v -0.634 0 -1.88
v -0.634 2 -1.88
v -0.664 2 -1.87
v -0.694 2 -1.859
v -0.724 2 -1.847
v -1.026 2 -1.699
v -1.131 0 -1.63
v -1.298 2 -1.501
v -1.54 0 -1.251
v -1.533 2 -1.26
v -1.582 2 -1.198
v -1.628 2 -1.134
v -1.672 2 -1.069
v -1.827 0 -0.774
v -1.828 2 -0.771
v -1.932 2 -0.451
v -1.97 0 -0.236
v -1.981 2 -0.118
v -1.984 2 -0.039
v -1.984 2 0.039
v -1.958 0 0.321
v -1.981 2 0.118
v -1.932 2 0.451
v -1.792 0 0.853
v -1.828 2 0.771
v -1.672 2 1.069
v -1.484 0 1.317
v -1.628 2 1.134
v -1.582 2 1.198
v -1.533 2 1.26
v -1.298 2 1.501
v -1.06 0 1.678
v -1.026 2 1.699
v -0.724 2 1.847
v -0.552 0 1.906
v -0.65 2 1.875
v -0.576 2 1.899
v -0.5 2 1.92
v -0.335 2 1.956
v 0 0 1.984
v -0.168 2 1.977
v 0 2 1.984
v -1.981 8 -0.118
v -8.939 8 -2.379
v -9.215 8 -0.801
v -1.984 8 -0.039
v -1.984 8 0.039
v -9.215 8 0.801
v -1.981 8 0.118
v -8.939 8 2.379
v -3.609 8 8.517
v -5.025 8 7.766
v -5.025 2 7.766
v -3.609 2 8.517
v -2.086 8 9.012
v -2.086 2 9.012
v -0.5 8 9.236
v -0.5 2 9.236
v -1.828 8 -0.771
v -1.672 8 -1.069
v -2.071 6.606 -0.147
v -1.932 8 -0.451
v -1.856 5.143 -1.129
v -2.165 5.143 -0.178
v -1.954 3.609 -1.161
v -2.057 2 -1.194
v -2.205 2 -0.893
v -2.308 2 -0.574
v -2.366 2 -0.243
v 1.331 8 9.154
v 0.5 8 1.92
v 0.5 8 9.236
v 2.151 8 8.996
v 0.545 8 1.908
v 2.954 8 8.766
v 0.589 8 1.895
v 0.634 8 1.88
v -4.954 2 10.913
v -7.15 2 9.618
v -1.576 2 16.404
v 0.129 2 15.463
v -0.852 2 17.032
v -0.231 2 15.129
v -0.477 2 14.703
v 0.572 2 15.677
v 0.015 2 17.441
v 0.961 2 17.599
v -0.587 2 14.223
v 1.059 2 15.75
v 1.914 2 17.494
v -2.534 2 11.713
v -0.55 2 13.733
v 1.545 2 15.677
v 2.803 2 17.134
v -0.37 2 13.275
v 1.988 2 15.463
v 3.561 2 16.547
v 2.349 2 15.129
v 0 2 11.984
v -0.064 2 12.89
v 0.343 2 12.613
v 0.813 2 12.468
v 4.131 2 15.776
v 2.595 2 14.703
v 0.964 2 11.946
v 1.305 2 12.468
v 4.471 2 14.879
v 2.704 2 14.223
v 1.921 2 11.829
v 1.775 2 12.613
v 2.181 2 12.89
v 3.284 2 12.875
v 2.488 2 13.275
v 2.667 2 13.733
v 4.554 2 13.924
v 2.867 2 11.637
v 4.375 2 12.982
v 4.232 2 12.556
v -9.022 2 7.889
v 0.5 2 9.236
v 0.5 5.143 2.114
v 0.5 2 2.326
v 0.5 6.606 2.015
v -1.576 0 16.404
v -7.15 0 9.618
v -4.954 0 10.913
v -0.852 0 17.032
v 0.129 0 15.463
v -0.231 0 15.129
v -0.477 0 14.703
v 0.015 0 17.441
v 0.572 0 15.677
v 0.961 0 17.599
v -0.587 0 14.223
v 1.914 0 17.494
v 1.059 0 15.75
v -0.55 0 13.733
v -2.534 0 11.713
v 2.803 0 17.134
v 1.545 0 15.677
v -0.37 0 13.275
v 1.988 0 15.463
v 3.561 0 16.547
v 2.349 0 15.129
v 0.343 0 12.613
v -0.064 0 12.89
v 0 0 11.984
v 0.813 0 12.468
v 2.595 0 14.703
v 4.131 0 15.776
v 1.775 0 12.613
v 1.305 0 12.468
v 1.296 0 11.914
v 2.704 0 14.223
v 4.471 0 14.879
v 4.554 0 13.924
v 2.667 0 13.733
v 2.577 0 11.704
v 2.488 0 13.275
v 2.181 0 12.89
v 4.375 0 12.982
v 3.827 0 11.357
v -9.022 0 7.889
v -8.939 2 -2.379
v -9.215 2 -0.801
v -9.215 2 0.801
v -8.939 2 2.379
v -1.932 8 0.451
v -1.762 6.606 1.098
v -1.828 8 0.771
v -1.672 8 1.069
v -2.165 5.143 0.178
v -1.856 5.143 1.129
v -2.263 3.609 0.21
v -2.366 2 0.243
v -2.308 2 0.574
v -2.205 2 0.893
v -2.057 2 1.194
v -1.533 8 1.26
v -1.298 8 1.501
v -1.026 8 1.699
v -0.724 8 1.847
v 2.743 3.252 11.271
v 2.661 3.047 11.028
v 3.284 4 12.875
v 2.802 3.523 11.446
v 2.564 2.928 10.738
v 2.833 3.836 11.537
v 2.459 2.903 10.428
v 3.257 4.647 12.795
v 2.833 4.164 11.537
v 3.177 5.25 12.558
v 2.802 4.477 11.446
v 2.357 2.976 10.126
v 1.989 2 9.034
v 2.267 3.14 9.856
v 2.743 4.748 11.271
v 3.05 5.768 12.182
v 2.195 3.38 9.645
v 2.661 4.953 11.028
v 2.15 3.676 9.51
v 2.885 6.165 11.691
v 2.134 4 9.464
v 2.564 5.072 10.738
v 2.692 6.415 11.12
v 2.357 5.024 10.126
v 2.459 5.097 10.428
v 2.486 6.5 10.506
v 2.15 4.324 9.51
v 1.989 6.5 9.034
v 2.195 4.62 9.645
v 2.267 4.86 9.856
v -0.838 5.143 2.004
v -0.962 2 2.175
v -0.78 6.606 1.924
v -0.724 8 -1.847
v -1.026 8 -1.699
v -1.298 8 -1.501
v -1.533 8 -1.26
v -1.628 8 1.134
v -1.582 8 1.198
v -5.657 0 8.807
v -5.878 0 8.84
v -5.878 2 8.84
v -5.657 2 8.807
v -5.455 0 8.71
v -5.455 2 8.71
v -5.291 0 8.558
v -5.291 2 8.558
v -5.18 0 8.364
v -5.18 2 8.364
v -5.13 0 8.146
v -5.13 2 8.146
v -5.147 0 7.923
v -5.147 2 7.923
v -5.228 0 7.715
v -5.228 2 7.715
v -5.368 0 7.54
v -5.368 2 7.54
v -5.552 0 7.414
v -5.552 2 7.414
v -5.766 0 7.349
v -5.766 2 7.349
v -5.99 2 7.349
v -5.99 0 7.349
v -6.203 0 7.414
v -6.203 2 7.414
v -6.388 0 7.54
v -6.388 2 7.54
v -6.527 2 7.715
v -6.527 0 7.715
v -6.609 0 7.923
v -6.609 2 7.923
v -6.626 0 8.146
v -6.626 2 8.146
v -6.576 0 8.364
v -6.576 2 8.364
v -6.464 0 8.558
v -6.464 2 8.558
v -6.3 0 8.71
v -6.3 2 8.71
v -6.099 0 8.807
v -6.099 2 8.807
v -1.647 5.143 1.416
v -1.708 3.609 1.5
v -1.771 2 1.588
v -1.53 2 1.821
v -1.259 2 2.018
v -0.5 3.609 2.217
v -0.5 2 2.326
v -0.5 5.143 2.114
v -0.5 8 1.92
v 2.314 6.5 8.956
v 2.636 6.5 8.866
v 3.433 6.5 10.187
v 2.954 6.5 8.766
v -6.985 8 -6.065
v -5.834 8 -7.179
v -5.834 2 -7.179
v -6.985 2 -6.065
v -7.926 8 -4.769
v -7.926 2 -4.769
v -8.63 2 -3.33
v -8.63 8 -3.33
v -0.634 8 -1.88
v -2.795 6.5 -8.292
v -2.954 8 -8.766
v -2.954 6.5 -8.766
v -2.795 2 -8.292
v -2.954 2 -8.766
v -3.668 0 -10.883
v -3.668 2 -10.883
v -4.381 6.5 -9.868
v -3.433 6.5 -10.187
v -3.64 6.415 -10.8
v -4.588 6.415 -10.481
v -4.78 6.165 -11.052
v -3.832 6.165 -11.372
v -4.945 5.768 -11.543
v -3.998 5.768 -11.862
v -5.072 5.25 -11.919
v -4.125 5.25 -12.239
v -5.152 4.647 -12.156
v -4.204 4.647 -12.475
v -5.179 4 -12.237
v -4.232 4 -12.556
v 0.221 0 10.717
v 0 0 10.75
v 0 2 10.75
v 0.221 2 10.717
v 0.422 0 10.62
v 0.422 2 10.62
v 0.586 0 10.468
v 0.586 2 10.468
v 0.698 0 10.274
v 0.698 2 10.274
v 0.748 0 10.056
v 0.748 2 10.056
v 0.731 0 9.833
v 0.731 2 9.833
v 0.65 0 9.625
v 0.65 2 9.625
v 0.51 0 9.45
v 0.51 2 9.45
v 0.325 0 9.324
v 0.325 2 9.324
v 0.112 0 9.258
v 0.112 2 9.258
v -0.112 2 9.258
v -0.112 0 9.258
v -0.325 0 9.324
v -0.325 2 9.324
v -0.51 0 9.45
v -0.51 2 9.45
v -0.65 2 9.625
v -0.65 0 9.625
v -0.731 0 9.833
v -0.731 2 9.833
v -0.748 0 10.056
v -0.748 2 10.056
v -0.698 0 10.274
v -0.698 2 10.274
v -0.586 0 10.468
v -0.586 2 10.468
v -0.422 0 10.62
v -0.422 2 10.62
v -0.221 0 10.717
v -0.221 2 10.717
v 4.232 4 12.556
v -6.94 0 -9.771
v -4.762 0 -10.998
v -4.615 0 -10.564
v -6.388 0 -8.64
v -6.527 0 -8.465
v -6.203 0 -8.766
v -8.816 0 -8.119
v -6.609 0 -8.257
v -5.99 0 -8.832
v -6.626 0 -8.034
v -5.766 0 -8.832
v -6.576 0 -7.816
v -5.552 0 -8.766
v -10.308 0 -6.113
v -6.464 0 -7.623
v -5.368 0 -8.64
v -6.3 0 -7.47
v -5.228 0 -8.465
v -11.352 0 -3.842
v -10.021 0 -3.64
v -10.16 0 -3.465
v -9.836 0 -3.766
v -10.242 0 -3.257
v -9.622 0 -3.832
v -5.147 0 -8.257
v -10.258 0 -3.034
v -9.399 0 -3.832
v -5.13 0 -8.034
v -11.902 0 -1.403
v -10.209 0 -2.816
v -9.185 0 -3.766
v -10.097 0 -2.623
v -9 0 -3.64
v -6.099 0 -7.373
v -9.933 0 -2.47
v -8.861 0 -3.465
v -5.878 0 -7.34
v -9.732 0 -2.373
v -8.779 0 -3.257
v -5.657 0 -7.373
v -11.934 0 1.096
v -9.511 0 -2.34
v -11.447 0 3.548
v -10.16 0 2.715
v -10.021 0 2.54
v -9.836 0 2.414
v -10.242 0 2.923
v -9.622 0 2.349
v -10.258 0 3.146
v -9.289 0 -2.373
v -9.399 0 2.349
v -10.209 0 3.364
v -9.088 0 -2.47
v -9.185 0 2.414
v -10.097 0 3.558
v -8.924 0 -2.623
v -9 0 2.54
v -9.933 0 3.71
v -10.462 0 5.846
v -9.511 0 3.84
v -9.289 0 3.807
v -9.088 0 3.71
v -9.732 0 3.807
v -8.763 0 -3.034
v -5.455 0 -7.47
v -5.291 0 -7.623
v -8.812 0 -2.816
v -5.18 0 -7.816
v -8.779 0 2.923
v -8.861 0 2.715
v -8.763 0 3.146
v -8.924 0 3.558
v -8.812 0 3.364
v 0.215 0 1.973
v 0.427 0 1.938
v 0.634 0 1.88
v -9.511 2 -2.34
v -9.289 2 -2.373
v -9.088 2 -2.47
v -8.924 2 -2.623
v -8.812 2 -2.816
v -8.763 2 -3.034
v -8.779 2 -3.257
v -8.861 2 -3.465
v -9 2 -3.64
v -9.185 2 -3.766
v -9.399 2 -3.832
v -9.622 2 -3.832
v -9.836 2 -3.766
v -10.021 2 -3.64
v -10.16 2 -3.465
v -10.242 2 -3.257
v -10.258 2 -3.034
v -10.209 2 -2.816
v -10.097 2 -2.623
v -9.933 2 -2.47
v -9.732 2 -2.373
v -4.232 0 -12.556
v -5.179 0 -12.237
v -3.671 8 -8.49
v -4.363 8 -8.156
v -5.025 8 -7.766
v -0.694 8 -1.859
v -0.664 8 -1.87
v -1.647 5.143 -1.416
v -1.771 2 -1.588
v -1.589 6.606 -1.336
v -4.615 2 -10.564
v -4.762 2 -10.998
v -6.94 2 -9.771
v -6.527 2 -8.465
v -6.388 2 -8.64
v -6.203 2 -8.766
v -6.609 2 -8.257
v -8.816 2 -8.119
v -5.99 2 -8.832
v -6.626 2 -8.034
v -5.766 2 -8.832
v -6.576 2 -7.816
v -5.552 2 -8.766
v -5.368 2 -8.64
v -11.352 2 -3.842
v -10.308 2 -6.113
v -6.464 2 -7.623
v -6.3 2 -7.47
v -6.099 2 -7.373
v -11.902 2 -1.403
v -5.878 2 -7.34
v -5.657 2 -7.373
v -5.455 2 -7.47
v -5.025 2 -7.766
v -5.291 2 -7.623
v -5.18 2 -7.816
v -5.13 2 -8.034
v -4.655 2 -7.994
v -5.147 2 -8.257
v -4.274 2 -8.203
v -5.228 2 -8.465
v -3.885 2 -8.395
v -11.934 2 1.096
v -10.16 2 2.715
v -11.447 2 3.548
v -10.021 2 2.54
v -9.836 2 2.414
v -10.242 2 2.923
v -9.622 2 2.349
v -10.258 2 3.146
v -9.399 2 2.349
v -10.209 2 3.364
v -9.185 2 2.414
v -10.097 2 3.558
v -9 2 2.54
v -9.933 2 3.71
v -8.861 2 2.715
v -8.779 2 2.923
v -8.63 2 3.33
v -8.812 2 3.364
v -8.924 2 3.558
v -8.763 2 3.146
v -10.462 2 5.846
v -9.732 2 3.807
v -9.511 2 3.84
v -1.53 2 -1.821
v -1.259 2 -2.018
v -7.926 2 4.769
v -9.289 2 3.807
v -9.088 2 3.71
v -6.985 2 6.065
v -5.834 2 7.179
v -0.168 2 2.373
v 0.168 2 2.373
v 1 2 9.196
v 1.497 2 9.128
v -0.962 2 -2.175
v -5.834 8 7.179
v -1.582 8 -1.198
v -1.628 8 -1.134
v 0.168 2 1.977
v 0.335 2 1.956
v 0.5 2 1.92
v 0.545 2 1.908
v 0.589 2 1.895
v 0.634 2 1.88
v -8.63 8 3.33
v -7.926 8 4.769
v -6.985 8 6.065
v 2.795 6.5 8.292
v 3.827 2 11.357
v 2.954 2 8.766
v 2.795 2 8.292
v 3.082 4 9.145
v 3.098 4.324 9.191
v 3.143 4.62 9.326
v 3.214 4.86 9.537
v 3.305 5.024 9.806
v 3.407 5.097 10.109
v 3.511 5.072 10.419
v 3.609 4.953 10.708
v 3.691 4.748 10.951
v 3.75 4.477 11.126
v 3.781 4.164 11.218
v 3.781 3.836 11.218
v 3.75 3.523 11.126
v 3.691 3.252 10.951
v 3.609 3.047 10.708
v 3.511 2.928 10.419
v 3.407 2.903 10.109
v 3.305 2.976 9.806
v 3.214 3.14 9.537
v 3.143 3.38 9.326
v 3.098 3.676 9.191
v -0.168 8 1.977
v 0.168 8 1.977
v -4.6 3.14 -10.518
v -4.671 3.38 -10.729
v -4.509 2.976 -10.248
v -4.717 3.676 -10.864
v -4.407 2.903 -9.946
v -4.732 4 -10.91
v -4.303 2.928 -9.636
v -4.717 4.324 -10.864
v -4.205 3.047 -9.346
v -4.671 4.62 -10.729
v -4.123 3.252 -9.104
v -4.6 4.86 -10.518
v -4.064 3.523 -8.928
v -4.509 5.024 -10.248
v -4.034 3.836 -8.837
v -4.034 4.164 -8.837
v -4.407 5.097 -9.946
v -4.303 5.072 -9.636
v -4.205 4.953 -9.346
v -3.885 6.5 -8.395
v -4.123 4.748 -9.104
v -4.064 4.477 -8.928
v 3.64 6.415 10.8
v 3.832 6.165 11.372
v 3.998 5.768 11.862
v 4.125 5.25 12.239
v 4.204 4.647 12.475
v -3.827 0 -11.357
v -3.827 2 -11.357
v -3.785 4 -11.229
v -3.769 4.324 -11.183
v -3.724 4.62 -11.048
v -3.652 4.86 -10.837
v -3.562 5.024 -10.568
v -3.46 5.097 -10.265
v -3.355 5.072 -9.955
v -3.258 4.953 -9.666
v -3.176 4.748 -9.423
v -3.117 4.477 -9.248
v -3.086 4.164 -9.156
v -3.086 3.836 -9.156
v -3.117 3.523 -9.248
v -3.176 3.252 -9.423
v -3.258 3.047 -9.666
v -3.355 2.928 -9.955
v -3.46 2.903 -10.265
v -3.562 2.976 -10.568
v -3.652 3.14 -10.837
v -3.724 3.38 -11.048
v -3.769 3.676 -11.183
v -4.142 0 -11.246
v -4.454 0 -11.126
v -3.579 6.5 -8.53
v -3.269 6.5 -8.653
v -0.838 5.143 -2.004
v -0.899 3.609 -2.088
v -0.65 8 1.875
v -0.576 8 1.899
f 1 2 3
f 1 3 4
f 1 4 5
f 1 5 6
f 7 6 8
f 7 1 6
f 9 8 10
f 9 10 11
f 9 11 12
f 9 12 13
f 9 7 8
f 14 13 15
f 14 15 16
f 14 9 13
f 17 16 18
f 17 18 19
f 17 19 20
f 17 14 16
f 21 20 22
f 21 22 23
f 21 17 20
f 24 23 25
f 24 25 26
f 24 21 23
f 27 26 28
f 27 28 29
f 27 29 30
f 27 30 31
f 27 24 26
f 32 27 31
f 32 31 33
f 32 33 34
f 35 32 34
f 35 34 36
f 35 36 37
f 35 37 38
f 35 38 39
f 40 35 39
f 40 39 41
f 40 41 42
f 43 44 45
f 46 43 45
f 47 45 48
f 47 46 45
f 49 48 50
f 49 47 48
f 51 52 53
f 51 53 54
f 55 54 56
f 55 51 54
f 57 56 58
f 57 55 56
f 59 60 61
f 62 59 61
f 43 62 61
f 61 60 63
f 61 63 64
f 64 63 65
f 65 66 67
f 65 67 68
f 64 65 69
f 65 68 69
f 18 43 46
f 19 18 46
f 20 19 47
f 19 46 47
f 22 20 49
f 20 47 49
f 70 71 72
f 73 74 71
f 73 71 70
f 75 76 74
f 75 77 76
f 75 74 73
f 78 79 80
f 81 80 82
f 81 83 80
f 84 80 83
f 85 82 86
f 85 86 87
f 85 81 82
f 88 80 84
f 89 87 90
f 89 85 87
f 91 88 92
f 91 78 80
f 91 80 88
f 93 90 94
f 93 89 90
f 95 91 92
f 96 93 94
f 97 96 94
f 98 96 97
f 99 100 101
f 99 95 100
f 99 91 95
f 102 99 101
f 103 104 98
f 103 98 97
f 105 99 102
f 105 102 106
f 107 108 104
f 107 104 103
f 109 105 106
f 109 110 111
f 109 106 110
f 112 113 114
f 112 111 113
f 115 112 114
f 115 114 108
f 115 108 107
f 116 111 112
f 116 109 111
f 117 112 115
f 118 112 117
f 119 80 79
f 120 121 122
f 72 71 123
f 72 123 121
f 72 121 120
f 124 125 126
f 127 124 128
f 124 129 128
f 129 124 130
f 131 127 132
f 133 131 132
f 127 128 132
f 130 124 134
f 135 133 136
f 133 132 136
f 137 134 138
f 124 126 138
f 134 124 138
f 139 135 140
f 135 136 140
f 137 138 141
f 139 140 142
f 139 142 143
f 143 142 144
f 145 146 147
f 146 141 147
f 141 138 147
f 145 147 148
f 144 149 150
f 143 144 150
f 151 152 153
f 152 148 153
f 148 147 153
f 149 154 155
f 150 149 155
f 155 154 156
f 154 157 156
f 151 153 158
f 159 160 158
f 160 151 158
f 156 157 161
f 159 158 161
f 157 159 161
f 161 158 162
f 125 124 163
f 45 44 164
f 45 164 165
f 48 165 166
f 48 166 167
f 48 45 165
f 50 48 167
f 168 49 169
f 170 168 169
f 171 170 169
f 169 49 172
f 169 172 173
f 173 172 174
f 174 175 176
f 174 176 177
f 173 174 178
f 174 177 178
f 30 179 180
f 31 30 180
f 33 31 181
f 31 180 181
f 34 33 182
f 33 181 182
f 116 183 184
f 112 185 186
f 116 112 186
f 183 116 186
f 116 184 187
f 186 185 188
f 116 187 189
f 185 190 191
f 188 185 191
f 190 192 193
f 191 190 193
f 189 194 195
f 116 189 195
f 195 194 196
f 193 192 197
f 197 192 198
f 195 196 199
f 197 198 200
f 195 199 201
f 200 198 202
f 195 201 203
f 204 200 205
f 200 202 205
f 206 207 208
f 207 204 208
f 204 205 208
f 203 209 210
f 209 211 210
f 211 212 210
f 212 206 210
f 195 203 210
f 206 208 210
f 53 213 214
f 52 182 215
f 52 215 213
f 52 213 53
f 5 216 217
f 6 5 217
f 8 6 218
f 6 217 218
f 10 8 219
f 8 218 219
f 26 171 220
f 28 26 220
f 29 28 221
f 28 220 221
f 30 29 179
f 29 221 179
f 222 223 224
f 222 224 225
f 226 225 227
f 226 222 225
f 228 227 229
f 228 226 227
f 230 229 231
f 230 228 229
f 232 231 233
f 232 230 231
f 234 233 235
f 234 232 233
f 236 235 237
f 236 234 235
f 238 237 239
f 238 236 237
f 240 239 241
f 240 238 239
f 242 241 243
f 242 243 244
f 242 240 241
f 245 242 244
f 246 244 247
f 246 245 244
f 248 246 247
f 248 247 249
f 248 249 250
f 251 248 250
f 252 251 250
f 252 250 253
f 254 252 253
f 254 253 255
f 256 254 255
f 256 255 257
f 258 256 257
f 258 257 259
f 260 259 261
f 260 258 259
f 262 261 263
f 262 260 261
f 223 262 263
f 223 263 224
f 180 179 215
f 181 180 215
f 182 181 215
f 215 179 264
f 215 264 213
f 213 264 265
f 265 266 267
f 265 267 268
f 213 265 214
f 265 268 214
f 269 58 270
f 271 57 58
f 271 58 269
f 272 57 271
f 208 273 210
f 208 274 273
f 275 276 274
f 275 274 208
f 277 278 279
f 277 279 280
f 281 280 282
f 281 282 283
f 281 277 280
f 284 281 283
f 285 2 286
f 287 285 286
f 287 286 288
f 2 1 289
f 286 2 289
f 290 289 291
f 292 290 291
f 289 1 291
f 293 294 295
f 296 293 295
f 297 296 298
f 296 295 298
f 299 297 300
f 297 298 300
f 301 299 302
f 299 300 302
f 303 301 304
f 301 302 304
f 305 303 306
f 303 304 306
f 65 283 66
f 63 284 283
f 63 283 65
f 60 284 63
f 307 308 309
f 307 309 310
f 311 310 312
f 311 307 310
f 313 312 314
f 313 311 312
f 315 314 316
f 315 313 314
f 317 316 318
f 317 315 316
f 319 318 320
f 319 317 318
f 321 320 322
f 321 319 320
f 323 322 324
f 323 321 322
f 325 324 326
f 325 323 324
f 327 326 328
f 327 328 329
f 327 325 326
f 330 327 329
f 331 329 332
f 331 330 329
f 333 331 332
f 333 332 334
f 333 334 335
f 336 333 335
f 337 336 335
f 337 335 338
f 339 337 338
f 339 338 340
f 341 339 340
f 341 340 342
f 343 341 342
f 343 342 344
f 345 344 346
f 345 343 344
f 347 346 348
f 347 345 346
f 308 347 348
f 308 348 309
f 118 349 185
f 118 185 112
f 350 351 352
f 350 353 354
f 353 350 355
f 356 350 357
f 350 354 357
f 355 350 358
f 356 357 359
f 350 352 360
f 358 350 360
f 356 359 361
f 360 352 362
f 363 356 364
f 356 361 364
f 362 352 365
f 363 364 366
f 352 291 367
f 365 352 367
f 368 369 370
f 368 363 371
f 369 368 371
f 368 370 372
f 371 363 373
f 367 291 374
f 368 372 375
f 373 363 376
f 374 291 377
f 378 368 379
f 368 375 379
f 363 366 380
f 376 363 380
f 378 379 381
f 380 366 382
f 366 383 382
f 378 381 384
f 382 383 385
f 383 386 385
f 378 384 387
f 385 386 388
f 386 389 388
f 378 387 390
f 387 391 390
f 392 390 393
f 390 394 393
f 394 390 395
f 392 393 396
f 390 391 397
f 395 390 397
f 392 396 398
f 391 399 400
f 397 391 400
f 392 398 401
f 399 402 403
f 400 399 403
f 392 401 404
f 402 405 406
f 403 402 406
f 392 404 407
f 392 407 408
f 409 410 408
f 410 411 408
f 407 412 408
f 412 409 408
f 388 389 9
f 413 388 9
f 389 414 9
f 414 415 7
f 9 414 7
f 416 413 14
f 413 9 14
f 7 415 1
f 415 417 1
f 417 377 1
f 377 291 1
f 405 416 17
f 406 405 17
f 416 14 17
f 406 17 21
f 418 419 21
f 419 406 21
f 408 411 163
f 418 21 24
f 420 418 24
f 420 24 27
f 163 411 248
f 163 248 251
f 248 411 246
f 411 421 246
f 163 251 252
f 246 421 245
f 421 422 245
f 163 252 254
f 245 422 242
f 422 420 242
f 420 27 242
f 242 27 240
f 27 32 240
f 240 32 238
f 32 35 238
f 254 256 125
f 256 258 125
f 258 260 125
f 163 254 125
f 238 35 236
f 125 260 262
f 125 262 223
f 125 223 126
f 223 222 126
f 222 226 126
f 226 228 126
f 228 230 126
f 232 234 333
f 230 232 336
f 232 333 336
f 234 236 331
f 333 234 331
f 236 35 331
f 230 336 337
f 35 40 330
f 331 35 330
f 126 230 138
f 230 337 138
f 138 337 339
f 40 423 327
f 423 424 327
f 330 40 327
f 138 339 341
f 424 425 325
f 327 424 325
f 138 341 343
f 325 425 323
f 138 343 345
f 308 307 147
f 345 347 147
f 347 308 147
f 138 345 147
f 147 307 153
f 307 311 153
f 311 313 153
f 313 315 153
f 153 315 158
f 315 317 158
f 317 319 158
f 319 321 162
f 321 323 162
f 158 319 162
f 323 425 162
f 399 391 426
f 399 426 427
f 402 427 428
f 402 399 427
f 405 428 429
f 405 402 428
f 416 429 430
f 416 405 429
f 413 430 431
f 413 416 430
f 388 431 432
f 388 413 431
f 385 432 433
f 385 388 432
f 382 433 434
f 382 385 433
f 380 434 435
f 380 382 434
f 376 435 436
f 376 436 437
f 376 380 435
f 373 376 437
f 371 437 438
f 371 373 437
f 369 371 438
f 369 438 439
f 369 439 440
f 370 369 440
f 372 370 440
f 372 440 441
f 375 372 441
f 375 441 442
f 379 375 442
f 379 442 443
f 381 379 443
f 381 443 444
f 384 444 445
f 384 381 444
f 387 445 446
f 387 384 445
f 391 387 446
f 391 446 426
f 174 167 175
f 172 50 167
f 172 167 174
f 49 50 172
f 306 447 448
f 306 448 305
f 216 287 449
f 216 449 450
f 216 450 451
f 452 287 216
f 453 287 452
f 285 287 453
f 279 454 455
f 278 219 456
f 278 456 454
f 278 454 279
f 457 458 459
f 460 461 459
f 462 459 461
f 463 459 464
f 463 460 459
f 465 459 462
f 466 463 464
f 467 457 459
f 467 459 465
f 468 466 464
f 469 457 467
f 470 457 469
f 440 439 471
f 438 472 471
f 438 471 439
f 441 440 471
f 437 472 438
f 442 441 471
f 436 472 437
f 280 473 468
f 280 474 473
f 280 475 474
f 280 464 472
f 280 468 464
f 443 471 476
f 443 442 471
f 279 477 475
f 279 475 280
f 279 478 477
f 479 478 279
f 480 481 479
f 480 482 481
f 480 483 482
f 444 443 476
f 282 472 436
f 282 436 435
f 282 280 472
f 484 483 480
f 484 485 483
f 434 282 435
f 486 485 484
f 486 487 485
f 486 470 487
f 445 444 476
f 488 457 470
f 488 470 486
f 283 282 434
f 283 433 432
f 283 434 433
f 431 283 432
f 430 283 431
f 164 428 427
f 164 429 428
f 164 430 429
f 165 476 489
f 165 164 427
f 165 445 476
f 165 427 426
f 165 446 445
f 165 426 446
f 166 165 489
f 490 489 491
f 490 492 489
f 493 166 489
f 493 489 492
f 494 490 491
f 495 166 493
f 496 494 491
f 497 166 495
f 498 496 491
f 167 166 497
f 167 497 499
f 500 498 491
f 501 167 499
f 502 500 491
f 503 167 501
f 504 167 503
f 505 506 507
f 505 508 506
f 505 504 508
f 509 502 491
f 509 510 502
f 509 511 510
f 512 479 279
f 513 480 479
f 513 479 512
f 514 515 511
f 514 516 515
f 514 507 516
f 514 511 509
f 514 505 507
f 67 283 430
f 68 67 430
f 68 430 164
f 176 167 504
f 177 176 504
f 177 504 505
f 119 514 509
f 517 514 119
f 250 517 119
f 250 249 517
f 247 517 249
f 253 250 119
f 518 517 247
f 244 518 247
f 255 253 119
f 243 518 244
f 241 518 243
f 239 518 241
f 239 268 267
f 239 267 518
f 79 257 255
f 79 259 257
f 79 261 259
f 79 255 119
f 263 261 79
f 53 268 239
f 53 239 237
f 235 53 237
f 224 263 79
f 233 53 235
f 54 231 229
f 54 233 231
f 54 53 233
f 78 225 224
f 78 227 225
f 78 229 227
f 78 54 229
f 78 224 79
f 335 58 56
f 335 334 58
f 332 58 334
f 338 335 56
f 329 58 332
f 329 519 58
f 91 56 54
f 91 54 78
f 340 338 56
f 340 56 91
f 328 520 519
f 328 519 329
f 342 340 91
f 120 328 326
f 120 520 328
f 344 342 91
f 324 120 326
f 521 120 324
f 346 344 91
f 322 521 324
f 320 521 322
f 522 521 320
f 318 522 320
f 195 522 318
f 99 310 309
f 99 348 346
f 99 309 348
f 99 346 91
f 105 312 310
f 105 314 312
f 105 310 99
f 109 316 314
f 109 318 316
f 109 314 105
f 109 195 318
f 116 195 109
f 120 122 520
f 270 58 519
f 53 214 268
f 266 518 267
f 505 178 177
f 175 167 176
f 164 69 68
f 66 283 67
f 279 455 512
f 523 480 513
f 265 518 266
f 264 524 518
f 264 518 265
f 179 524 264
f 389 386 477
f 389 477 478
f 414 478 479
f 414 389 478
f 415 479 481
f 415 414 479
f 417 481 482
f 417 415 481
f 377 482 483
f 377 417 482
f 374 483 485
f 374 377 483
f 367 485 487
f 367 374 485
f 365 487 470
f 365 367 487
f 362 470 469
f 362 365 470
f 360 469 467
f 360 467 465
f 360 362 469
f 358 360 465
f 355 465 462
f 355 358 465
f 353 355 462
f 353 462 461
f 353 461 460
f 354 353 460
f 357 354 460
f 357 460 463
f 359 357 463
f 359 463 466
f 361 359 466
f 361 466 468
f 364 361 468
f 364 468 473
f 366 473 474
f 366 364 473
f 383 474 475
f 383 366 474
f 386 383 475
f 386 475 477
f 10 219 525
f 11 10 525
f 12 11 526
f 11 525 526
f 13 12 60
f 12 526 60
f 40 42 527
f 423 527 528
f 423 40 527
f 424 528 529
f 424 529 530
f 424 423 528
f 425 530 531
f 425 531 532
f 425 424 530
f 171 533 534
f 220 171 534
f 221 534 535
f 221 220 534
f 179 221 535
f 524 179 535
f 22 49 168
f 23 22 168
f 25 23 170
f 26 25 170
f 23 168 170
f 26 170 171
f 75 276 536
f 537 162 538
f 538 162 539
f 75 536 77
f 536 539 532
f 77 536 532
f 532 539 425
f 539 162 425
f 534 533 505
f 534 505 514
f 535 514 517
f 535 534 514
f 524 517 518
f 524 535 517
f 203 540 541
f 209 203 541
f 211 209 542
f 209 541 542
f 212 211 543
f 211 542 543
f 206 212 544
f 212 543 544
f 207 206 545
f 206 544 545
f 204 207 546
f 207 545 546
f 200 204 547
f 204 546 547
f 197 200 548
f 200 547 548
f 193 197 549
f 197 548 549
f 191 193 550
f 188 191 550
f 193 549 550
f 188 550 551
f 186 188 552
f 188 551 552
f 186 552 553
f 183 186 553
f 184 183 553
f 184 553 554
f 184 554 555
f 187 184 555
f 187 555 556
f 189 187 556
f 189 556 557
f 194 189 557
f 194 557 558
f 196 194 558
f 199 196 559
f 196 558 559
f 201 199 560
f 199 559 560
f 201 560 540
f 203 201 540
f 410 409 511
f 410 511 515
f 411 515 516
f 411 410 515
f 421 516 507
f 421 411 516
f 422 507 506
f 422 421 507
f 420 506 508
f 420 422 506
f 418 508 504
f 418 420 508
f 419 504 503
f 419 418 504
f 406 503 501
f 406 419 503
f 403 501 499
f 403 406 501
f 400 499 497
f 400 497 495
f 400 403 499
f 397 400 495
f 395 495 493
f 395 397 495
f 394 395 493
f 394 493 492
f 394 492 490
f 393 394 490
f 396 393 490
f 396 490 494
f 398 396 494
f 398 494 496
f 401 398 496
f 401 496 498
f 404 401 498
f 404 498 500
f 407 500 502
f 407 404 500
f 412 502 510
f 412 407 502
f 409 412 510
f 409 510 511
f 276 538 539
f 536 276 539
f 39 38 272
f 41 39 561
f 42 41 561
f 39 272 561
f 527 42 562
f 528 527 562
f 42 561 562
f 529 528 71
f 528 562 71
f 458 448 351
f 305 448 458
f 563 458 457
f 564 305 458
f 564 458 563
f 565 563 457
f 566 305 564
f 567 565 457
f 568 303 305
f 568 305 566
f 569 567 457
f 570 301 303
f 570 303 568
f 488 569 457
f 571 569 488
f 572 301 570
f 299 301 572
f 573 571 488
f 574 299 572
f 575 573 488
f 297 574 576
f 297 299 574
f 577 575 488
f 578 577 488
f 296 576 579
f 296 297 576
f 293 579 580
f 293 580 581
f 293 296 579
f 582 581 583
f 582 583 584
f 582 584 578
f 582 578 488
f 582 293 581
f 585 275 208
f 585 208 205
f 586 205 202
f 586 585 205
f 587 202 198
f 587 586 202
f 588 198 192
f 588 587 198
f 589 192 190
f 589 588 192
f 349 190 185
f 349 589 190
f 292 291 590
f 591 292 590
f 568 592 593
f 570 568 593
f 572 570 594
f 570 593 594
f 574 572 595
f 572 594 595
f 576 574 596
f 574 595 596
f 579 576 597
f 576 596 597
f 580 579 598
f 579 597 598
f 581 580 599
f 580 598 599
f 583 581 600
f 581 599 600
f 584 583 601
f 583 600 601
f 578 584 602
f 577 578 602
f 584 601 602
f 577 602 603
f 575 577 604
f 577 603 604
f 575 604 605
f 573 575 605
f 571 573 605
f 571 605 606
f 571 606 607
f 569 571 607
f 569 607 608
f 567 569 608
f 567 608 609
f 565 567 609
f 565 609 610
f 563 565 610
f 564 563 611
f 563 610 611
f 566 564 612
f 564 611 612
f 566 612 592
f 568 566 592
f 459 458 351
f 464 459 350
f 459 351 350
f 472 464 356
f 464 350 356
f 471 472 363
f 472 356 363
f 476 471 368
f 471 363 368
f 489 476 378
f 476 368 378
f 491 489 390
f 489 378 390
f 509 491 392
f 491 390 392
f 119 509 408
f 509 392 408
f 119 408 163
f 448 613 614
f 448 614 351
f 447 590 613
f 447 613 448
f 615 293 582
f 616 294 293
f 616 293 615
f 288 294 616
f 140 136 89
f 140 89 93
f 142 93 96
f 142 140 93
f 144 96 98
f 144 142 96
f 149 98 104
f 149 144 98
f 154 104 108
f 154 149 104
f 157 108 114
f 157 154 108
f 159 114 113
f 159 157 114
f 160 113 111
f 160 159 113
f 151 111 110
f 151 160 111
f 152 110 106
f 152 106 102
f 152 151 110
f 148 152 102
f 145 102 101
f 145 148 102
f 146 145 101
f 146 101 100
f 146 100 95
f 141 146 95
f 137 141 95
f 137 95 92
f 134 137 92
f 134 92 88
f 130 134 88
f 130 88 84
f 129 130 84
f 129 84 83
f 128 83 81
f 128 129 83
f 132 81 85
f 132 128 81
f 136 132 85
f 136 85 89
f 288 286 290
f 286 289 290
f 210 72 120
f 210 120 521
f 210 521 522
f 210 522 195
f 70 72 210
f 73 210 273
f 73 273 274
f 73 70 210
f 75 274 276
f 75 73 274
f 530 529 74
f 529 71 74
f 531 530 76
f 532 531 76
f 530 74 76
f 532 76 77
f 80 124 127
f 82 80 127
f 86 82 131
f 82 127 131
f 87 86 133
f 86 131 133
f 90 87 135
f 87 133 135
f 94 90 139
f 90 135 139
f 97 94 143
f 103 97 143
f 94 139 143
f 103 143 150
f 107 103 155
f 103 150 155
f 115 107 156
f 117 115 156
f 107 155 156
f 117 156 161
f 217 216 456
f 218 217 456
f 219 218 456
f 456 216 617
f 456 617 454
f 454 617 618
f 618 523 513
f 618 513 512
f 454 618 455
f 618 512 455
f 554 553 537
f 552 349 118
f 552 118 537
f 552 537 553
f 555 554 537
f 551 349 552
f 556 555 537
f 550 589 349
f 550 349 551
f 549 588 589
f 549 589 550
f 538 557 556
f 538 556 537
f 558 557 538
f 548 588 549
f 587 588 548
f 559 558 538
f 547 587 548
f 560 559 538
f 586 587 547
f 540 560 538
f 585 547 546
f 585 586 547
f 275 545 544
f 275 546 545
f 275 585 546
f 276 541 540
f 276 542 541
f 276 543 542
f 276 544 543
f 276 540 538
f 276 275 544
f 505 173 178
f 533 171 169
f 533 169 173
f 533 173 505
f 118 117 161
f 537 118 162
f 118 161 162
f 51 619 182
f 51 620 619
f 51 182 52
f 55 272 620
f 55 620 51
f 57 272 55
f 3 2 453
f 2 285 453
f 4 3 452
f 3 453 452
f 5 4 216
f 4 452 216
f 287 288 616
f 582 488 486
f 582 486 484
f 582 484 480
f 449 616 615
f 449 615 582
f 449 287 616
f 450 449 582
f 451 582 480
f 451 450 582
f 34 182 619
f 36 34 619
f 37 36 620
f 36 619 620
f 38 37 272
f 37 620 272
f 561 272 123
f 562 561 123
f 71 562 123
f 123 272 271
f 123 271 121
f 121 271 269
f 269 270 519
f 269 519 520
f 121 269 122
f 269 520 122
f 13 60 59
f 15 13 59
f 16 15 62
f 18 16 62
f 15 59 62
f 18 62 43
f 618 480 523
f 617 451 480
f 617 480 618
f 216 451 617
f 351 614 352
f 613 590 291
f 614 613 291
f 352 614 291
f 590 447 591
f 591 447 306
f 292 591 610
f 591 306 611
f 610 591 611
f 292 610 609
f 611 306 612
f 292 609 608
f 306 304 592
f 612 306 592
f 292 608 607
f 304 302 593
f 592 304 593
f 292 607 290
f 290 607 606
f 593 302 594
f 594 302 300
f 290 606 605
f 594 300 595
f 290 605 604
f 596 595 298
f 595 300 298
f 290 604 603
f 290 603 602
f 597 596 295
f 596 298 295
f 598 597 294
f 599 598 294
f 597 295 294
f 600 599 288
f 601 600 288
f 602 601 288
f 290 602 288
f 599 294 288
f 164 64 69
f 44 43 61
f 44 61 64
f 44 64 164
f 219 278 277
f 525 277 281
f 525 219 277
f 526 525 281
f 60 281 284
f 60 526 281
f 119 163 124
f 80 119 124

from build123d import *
from build123d.topology import SkipClean

# Parameters (mm, degrees)
SKETCH1_R           = 11.984375
SKETCH1_R_2         = 1.984375
SKETCH1_R_3         = 0.75
BOSS_EXTRUDE1_DEPTH = 2
SKETCH6_W           = 23.96875
SKETCH6_H           = 8
CUT_EXTRUDE1_DEPTH  = 19.741677841
BOSS_EXTRUDE3_START = -2
SKETCH7_R           = 1.65
BOSS_EXTRUDE3_DEPTH = 2
SKETCH8_R           = 1.1
BOSS_EXTRUDE4_DEPTH = 1


with BuildPart() as part:
    # Sketch1 → Boss-Extrude1 (new body)
    with BuildSketch(Plane(origin=(0, 0, 0), x_dir=(1, 0, 0), z_dir=(0, 1, 0))):
        with Locations(Location((0, 0, 0), (0, 0, 270))):
            Circle(SKETCH1_R)
        with Locations(Location((0, 0, 0), (0, 0, 270))):
            Circle(SKETCH1_R_2, mode=Mode.SUBTRACT)
        with Locations(Location((0, 10, 0), (0, 0, 270))):
            Circle(SKETCH1_R_3, mode=Mode.SUBTRACT)
        with Locations(Location((5.877852523, 8.090169944, 0), (0, 0, 270))):
            Circle(SKETCH1_R_3, mode=Mode.SUBTRACT)
        with Locations(Location((9.510565163, 3.090169944, 0), (0, 0, 270))):
            Circle(SKETCH1_R_3, mode=Mode.SUBTRACT)
        with Locations(Location((9.510565163, -3.090169944, 0), (0, 0, 270))):
            Circle(SKETCH1_R_3, mode=Mode.SUBTRACT)
        with Locations(Location((5.877852523, -8.090169944, 0), (0, 0, 270))):
            Circle(SKETCH1_R_3, mode=Mode.SUBTRACT)
        with Locations(Location((0, -10, 0), (0, 0, 270))):
            Circle(SKETCH1_R_3, mode=Mode.SUBTRACT)
        with Locations(Location((-5.877852523, -8.090169944, 0), (0, 0, 270))):
            Circle(SKETCH1_R_3, mode=Mode.SUBTRACT)
        with Locations(Location((-9.510565163, -3.090169944, 0), (0, 0, 270))):
            Circle(SKETCH1_R_3, mode=Mode.SUBTRACT)
        with Locations(Location((-9.510565163, 3.090169944, 0), (0, 0, 270))):
            Circle(SKETCH1_R_3, mode=Mode.SUBTRACT)
        with Locations(Location((-5.877852523, 8.090169944, 0), (0, 0, 270))):
            Circle(SKETCH1_R_3, mode=Mode.SUBTRACT)
    extrude(amount=BOSS_EXTRUDE1_DEPTH)

    # Sweep1: sweep along a path in Sketch3
    with SkipClean():  # the faces are left unmerged after this step: merging them gives an invalid solid
        with BuildLine(Plane(origin=(0, 0, 0), x_dir=(0, 0, -1), z_dir=(1, 0, 0))) as sweep1_path:
            Line((0, 2), (0, 8))
        # Sketch2 → Sweep1 (sweep)
        with BuildSketch(Plane(origin=(0, 2, 0), x_dir=(1, 0, 0), z_dir=(0, 1, 0))):
            with BuildLine():
                Line((-0.5, 9.236476601), (-0.5, 1.920350005))
                ThreePointArc((-0.5, 1.920350005), (-0.613205598, 1.887252775), (-0.724244915, 1.847488415))
                Line((-0.724244915, 1.847488415), (-5.024556232, 7.766359164))
                ThreePointArc((-5.024556232, 7.766359164), (-2.858407198, 8.797272776), (-0.5, 9.236476601))
            make_face()
            with BuildLine():
                Line((0.5, 9.236476601), (0.5, 1.920350005))
                ThreePointArc((0.5, 1.920350005), (0.613205598, 1.887252775), (0.724244915, 1.847488415))
                Line((0.724244915, 1.847488415), (5.024556232, 7.766359164))
                ThreePointArc((5.024556232, 7.766359164), (2.858407198, 8.797272776), (0.5, 9.236476601))
            make_face()
            with BuildLine():
                Line((5.833573226, 7.178573912), (1.533261909, 1.259703163))
                ThreePointArc((1.533261909, 1.259703163), (1.605393098, 1.16638636), (1.671852888, 1.068949045))
                Line((1.671852888, 1.068949045), (8.629902762, 3.329756496))
                ThreePointArc((8.629902762, 3.329756496), (7.483407198, 5.437013584), (5.833573226, 7.178573912))
            make_face()
            with BuildLine():
                Line((8.938919756, 2.37869998), (1.980869883, 0.117892528))
                ThreePointArc((1.980869883, 0.117892528), (1.984375, 0), (1.980869883, -0.117892528))
                Line((1.980869883, -0.117892528), (8.938919756, -2.37869998))
                ThreePointArc((8.938919756, -2.37869998), (9.25, 0), (8.938919756, 2.37869998))
            make_face()
            with BuildLine():
                Line((8.629902762, -3.329756496), (1.671852888, -1.068949045))
                ThreePointArc((1.671852888, -1.068949045), (1.605393098, -1.16638636), (1.533261909, -1.259703163))
                Line((1.533261909, -1.259703163), (5.833573226, -7.178573912))
                ThreePointArc((5.833573226, -7.178573912), (7.483407198, -5.437013584), (8.629902762, -3.329756496))
            make_face()
            with BuildLine():
                Line((5.024556232, -7.766359164), (0.724244915, -1.847488415))
                ThreePointArc((0.724244915, -1.847488415), (0.613205598, -1.887252775), (0.5, -1.920350005))
                Line((0.5, -1.920350005), (0.5, -9.236476601))
                ThreePointArc((0.5, -9.236476601), (2.858407198, -8.797272776), (5.024556232, -7.766359164))
            make_face()
            with BuildLine():
                Line((-0.5, -9.236476601), (-0.5, -1.920350005))
                ThreePointArc((-0.5, -1.920350005), (-0.613205598, -1.887252775), (-0.724244915, -1.847488415))
                Line((-0.724244915, -1.847488415), (-5.024556232, -7.766359164))
                ThreePointArc((-5.024556232, -7.766359164), (-2.858407198, -8.797272776), (-0.5, -9.236476601))
            make_face()
            with BuildLine():
                Line((-5.833573226, -7.178573912), (-1.533261909, -1.259703163))
                ThreePointArc((-1.533261909, -1.259703163), (-1.605393098, -1.16638636), (-1.671852888, -1.068949045))
                Line((-1.671852888, -1.068949045), (-8.629902762, -3.329756496))
                ThreePointArc((-8.629902762, -3.329756496), (-7.483407198, -5.437013584), (-5.833573226, -7.178573912))
            make_face()
            with BuildLine():
                Line((-8.938919756, -2.37869998), (-1.980869883, -0.117892528))
                ThreePointArc((-1.980869883, -0.117892528), (-1.984375, 0), (-1.980869883, 0.117892528))
                Line((-1.980869883, 0.117892528), (-8.938919756, 2.37869998))
                ThreePointArc((-8.938919756, 2.37869998), (-9.25, 0), (-8.938919756, -2.37869998))
            make_face()
            with BuildLine():
                Line((-8.629902762, 3.329756496), (-1.671852888, 1.068949045))
                ThreePointArc((-1.671852888, 1.068949045), (-1.605393098, 1.16638636), (-1.533261909, 1.259703163))
                Line((-1.533261909, 1.259703163), (-5.833573226, 7.178573912))
                ThreePointArc((-5.833573226, 7.178573912), (-7.483407198, 5.437013584), (-8.629902762, 3.329756496))
            make_face()
        sweep(path=sweep1_path.line)

    # Sketch4 → Revolve1 (revolve)
    with SkipClean():  # the faces are left unmerged after this step: merging them gives an invalid solid
        with BuildSketch(Plane(origin=(0, 0, 0), x_dir=(0, 0, -1), z_dir=(1, 0, 0)), mode=Mode.PRIVATE) as revolve1_sk:
            Polygon((-2.37869998, 2), (-1.984375, 2), (-1.984375, 8), align=None)
        revolve(revolve1_sk.sketch.rotate(Axis((0, 0, 0), (0, 1, 0)), 165.405971265), axis=Axis((0, 0, 0), (0, 1, 0)))

    # Sketch6 → Cut-Extrude1 (cut, through all)
    with SkipClean():  # the faces are left unmerged after this step: merging them gives an invalid solid
        with BuildSketch(Plane(origin=(0, 0, 0), x_dir=(-0.3193728209047868, 0, -0.9476291475399641), z_dir=(-0.9476291475399641, 0, 0.3193728209047868))):
            with Locations((0, -4)):
                Rectangle(SKETCH6_W, SKETCH6_H)
        extrude(amount=-CUT_EXTRUDE1_DEPTH, mode=Mode.SUBTRACT)

    # Sketch7 → Boss-Extrude3 (add)
    with SkipClean():  # the faces are left unmerged after this step: merging them gives an invalid solid
        with BuildSketch(Plane(origin=(0, 2, 0), x_dir=(1, 0, 0), z_dir=(0, 1, 0)).offset(BOSS_EXTRUDE3_START)):
            with BuildLine():
                Line((-9.021857716, -7.888683508), (-1.576209535, -16.403865848))
                ThreePointArc((-1.576209535, -16.403865848), (2.803074288, -17.134270389), (4.375298385, -12.982195127))
                Line((4.375298385, -12.982195127), (3.827483651, -11.356743065))
                ThreePointArc((3.827483651, -11.356743065), (-3.122857627, -11.570350227), (-9.021857716, -7.888683508))
            make_face()
            with Locations(Location((1.058596369, -14.1, 0), (0, 0, 270))):
                Circle(SKETCH7_R, mode=Mode.SUBTRACT)
        extrude(amount=BOSS_EXTRUDE3_DEPTH)

    # Sketch8 → Boss-Extrude4 (add)
    # profile 1 of 2: a face of its own
    with SkipClean():  # the faces are left unmerged after this step: merging them gives an invalid solid
        with BuildSketch(Plane(origin=(0, 0, 0), x_dir=(-0.31937282090478675, 0, -0.9476291475399641), z_dir=(0.9476291475399641, 0, -0.31937282090478675))):
            with BuildLine():
                Line((-13.25, 4), (-13.25, 2))
                Line((-13.25, 2), (-8.75, 2))
                Line((-8.75, 2), (-8.75, 6.5))
                Line((-8.75, 6.5), (-9.25, 6.5))
                Line((-9.25, 6.5), (-10.75, 6.5))
                ThreePointArc((-10.75, 6.5), (-12.517766953, 5.767766953), (-13.25, 4))
            make_face()
            with Locations((-10.75, 4)):
                Circle(SKETCH8_R, mode=Mode.SUBTRACT)
        # profile 2 of 2: a face of its own
        with BuildSketch(Plane(origin=(0, 0, 0), x_dir=(-0.31937282090478675, 0, -0.9476291475399641), z_dir=(0.9476291475399641, 0, -0.31937282090478675))):
            with BuildLine():
                Line((11.484375, 2), (8.75, 2))
                Line((8.75, 2), (8.75, 6.5))
                Line((8.75, 6.5), (9.25, 6.5))
                Line((9.25, 6.5), (10.75, 6.5))
                ThreePointArc((10.75, 6.5), (12.517766953, 5.767766953), (13.25, 4))
                Line((13.25, 4), (13.25, 2))
                Line((13.25, 2), (13.25, 0))
                Line((13.25, 0), (11.984375, 0))
                Line((11.984375, 0), (11.484375, 0))
                Line((11.484375, 0), (11.484375, 2))
            make_face()
            with Locations((10.75, 4)):
                Circle(SKETCH8_R, mode=Mode.SUBTRACT)
        extrude(amount=-BOSS_EXTRUDE4_DEPTH)


solid = part.part
